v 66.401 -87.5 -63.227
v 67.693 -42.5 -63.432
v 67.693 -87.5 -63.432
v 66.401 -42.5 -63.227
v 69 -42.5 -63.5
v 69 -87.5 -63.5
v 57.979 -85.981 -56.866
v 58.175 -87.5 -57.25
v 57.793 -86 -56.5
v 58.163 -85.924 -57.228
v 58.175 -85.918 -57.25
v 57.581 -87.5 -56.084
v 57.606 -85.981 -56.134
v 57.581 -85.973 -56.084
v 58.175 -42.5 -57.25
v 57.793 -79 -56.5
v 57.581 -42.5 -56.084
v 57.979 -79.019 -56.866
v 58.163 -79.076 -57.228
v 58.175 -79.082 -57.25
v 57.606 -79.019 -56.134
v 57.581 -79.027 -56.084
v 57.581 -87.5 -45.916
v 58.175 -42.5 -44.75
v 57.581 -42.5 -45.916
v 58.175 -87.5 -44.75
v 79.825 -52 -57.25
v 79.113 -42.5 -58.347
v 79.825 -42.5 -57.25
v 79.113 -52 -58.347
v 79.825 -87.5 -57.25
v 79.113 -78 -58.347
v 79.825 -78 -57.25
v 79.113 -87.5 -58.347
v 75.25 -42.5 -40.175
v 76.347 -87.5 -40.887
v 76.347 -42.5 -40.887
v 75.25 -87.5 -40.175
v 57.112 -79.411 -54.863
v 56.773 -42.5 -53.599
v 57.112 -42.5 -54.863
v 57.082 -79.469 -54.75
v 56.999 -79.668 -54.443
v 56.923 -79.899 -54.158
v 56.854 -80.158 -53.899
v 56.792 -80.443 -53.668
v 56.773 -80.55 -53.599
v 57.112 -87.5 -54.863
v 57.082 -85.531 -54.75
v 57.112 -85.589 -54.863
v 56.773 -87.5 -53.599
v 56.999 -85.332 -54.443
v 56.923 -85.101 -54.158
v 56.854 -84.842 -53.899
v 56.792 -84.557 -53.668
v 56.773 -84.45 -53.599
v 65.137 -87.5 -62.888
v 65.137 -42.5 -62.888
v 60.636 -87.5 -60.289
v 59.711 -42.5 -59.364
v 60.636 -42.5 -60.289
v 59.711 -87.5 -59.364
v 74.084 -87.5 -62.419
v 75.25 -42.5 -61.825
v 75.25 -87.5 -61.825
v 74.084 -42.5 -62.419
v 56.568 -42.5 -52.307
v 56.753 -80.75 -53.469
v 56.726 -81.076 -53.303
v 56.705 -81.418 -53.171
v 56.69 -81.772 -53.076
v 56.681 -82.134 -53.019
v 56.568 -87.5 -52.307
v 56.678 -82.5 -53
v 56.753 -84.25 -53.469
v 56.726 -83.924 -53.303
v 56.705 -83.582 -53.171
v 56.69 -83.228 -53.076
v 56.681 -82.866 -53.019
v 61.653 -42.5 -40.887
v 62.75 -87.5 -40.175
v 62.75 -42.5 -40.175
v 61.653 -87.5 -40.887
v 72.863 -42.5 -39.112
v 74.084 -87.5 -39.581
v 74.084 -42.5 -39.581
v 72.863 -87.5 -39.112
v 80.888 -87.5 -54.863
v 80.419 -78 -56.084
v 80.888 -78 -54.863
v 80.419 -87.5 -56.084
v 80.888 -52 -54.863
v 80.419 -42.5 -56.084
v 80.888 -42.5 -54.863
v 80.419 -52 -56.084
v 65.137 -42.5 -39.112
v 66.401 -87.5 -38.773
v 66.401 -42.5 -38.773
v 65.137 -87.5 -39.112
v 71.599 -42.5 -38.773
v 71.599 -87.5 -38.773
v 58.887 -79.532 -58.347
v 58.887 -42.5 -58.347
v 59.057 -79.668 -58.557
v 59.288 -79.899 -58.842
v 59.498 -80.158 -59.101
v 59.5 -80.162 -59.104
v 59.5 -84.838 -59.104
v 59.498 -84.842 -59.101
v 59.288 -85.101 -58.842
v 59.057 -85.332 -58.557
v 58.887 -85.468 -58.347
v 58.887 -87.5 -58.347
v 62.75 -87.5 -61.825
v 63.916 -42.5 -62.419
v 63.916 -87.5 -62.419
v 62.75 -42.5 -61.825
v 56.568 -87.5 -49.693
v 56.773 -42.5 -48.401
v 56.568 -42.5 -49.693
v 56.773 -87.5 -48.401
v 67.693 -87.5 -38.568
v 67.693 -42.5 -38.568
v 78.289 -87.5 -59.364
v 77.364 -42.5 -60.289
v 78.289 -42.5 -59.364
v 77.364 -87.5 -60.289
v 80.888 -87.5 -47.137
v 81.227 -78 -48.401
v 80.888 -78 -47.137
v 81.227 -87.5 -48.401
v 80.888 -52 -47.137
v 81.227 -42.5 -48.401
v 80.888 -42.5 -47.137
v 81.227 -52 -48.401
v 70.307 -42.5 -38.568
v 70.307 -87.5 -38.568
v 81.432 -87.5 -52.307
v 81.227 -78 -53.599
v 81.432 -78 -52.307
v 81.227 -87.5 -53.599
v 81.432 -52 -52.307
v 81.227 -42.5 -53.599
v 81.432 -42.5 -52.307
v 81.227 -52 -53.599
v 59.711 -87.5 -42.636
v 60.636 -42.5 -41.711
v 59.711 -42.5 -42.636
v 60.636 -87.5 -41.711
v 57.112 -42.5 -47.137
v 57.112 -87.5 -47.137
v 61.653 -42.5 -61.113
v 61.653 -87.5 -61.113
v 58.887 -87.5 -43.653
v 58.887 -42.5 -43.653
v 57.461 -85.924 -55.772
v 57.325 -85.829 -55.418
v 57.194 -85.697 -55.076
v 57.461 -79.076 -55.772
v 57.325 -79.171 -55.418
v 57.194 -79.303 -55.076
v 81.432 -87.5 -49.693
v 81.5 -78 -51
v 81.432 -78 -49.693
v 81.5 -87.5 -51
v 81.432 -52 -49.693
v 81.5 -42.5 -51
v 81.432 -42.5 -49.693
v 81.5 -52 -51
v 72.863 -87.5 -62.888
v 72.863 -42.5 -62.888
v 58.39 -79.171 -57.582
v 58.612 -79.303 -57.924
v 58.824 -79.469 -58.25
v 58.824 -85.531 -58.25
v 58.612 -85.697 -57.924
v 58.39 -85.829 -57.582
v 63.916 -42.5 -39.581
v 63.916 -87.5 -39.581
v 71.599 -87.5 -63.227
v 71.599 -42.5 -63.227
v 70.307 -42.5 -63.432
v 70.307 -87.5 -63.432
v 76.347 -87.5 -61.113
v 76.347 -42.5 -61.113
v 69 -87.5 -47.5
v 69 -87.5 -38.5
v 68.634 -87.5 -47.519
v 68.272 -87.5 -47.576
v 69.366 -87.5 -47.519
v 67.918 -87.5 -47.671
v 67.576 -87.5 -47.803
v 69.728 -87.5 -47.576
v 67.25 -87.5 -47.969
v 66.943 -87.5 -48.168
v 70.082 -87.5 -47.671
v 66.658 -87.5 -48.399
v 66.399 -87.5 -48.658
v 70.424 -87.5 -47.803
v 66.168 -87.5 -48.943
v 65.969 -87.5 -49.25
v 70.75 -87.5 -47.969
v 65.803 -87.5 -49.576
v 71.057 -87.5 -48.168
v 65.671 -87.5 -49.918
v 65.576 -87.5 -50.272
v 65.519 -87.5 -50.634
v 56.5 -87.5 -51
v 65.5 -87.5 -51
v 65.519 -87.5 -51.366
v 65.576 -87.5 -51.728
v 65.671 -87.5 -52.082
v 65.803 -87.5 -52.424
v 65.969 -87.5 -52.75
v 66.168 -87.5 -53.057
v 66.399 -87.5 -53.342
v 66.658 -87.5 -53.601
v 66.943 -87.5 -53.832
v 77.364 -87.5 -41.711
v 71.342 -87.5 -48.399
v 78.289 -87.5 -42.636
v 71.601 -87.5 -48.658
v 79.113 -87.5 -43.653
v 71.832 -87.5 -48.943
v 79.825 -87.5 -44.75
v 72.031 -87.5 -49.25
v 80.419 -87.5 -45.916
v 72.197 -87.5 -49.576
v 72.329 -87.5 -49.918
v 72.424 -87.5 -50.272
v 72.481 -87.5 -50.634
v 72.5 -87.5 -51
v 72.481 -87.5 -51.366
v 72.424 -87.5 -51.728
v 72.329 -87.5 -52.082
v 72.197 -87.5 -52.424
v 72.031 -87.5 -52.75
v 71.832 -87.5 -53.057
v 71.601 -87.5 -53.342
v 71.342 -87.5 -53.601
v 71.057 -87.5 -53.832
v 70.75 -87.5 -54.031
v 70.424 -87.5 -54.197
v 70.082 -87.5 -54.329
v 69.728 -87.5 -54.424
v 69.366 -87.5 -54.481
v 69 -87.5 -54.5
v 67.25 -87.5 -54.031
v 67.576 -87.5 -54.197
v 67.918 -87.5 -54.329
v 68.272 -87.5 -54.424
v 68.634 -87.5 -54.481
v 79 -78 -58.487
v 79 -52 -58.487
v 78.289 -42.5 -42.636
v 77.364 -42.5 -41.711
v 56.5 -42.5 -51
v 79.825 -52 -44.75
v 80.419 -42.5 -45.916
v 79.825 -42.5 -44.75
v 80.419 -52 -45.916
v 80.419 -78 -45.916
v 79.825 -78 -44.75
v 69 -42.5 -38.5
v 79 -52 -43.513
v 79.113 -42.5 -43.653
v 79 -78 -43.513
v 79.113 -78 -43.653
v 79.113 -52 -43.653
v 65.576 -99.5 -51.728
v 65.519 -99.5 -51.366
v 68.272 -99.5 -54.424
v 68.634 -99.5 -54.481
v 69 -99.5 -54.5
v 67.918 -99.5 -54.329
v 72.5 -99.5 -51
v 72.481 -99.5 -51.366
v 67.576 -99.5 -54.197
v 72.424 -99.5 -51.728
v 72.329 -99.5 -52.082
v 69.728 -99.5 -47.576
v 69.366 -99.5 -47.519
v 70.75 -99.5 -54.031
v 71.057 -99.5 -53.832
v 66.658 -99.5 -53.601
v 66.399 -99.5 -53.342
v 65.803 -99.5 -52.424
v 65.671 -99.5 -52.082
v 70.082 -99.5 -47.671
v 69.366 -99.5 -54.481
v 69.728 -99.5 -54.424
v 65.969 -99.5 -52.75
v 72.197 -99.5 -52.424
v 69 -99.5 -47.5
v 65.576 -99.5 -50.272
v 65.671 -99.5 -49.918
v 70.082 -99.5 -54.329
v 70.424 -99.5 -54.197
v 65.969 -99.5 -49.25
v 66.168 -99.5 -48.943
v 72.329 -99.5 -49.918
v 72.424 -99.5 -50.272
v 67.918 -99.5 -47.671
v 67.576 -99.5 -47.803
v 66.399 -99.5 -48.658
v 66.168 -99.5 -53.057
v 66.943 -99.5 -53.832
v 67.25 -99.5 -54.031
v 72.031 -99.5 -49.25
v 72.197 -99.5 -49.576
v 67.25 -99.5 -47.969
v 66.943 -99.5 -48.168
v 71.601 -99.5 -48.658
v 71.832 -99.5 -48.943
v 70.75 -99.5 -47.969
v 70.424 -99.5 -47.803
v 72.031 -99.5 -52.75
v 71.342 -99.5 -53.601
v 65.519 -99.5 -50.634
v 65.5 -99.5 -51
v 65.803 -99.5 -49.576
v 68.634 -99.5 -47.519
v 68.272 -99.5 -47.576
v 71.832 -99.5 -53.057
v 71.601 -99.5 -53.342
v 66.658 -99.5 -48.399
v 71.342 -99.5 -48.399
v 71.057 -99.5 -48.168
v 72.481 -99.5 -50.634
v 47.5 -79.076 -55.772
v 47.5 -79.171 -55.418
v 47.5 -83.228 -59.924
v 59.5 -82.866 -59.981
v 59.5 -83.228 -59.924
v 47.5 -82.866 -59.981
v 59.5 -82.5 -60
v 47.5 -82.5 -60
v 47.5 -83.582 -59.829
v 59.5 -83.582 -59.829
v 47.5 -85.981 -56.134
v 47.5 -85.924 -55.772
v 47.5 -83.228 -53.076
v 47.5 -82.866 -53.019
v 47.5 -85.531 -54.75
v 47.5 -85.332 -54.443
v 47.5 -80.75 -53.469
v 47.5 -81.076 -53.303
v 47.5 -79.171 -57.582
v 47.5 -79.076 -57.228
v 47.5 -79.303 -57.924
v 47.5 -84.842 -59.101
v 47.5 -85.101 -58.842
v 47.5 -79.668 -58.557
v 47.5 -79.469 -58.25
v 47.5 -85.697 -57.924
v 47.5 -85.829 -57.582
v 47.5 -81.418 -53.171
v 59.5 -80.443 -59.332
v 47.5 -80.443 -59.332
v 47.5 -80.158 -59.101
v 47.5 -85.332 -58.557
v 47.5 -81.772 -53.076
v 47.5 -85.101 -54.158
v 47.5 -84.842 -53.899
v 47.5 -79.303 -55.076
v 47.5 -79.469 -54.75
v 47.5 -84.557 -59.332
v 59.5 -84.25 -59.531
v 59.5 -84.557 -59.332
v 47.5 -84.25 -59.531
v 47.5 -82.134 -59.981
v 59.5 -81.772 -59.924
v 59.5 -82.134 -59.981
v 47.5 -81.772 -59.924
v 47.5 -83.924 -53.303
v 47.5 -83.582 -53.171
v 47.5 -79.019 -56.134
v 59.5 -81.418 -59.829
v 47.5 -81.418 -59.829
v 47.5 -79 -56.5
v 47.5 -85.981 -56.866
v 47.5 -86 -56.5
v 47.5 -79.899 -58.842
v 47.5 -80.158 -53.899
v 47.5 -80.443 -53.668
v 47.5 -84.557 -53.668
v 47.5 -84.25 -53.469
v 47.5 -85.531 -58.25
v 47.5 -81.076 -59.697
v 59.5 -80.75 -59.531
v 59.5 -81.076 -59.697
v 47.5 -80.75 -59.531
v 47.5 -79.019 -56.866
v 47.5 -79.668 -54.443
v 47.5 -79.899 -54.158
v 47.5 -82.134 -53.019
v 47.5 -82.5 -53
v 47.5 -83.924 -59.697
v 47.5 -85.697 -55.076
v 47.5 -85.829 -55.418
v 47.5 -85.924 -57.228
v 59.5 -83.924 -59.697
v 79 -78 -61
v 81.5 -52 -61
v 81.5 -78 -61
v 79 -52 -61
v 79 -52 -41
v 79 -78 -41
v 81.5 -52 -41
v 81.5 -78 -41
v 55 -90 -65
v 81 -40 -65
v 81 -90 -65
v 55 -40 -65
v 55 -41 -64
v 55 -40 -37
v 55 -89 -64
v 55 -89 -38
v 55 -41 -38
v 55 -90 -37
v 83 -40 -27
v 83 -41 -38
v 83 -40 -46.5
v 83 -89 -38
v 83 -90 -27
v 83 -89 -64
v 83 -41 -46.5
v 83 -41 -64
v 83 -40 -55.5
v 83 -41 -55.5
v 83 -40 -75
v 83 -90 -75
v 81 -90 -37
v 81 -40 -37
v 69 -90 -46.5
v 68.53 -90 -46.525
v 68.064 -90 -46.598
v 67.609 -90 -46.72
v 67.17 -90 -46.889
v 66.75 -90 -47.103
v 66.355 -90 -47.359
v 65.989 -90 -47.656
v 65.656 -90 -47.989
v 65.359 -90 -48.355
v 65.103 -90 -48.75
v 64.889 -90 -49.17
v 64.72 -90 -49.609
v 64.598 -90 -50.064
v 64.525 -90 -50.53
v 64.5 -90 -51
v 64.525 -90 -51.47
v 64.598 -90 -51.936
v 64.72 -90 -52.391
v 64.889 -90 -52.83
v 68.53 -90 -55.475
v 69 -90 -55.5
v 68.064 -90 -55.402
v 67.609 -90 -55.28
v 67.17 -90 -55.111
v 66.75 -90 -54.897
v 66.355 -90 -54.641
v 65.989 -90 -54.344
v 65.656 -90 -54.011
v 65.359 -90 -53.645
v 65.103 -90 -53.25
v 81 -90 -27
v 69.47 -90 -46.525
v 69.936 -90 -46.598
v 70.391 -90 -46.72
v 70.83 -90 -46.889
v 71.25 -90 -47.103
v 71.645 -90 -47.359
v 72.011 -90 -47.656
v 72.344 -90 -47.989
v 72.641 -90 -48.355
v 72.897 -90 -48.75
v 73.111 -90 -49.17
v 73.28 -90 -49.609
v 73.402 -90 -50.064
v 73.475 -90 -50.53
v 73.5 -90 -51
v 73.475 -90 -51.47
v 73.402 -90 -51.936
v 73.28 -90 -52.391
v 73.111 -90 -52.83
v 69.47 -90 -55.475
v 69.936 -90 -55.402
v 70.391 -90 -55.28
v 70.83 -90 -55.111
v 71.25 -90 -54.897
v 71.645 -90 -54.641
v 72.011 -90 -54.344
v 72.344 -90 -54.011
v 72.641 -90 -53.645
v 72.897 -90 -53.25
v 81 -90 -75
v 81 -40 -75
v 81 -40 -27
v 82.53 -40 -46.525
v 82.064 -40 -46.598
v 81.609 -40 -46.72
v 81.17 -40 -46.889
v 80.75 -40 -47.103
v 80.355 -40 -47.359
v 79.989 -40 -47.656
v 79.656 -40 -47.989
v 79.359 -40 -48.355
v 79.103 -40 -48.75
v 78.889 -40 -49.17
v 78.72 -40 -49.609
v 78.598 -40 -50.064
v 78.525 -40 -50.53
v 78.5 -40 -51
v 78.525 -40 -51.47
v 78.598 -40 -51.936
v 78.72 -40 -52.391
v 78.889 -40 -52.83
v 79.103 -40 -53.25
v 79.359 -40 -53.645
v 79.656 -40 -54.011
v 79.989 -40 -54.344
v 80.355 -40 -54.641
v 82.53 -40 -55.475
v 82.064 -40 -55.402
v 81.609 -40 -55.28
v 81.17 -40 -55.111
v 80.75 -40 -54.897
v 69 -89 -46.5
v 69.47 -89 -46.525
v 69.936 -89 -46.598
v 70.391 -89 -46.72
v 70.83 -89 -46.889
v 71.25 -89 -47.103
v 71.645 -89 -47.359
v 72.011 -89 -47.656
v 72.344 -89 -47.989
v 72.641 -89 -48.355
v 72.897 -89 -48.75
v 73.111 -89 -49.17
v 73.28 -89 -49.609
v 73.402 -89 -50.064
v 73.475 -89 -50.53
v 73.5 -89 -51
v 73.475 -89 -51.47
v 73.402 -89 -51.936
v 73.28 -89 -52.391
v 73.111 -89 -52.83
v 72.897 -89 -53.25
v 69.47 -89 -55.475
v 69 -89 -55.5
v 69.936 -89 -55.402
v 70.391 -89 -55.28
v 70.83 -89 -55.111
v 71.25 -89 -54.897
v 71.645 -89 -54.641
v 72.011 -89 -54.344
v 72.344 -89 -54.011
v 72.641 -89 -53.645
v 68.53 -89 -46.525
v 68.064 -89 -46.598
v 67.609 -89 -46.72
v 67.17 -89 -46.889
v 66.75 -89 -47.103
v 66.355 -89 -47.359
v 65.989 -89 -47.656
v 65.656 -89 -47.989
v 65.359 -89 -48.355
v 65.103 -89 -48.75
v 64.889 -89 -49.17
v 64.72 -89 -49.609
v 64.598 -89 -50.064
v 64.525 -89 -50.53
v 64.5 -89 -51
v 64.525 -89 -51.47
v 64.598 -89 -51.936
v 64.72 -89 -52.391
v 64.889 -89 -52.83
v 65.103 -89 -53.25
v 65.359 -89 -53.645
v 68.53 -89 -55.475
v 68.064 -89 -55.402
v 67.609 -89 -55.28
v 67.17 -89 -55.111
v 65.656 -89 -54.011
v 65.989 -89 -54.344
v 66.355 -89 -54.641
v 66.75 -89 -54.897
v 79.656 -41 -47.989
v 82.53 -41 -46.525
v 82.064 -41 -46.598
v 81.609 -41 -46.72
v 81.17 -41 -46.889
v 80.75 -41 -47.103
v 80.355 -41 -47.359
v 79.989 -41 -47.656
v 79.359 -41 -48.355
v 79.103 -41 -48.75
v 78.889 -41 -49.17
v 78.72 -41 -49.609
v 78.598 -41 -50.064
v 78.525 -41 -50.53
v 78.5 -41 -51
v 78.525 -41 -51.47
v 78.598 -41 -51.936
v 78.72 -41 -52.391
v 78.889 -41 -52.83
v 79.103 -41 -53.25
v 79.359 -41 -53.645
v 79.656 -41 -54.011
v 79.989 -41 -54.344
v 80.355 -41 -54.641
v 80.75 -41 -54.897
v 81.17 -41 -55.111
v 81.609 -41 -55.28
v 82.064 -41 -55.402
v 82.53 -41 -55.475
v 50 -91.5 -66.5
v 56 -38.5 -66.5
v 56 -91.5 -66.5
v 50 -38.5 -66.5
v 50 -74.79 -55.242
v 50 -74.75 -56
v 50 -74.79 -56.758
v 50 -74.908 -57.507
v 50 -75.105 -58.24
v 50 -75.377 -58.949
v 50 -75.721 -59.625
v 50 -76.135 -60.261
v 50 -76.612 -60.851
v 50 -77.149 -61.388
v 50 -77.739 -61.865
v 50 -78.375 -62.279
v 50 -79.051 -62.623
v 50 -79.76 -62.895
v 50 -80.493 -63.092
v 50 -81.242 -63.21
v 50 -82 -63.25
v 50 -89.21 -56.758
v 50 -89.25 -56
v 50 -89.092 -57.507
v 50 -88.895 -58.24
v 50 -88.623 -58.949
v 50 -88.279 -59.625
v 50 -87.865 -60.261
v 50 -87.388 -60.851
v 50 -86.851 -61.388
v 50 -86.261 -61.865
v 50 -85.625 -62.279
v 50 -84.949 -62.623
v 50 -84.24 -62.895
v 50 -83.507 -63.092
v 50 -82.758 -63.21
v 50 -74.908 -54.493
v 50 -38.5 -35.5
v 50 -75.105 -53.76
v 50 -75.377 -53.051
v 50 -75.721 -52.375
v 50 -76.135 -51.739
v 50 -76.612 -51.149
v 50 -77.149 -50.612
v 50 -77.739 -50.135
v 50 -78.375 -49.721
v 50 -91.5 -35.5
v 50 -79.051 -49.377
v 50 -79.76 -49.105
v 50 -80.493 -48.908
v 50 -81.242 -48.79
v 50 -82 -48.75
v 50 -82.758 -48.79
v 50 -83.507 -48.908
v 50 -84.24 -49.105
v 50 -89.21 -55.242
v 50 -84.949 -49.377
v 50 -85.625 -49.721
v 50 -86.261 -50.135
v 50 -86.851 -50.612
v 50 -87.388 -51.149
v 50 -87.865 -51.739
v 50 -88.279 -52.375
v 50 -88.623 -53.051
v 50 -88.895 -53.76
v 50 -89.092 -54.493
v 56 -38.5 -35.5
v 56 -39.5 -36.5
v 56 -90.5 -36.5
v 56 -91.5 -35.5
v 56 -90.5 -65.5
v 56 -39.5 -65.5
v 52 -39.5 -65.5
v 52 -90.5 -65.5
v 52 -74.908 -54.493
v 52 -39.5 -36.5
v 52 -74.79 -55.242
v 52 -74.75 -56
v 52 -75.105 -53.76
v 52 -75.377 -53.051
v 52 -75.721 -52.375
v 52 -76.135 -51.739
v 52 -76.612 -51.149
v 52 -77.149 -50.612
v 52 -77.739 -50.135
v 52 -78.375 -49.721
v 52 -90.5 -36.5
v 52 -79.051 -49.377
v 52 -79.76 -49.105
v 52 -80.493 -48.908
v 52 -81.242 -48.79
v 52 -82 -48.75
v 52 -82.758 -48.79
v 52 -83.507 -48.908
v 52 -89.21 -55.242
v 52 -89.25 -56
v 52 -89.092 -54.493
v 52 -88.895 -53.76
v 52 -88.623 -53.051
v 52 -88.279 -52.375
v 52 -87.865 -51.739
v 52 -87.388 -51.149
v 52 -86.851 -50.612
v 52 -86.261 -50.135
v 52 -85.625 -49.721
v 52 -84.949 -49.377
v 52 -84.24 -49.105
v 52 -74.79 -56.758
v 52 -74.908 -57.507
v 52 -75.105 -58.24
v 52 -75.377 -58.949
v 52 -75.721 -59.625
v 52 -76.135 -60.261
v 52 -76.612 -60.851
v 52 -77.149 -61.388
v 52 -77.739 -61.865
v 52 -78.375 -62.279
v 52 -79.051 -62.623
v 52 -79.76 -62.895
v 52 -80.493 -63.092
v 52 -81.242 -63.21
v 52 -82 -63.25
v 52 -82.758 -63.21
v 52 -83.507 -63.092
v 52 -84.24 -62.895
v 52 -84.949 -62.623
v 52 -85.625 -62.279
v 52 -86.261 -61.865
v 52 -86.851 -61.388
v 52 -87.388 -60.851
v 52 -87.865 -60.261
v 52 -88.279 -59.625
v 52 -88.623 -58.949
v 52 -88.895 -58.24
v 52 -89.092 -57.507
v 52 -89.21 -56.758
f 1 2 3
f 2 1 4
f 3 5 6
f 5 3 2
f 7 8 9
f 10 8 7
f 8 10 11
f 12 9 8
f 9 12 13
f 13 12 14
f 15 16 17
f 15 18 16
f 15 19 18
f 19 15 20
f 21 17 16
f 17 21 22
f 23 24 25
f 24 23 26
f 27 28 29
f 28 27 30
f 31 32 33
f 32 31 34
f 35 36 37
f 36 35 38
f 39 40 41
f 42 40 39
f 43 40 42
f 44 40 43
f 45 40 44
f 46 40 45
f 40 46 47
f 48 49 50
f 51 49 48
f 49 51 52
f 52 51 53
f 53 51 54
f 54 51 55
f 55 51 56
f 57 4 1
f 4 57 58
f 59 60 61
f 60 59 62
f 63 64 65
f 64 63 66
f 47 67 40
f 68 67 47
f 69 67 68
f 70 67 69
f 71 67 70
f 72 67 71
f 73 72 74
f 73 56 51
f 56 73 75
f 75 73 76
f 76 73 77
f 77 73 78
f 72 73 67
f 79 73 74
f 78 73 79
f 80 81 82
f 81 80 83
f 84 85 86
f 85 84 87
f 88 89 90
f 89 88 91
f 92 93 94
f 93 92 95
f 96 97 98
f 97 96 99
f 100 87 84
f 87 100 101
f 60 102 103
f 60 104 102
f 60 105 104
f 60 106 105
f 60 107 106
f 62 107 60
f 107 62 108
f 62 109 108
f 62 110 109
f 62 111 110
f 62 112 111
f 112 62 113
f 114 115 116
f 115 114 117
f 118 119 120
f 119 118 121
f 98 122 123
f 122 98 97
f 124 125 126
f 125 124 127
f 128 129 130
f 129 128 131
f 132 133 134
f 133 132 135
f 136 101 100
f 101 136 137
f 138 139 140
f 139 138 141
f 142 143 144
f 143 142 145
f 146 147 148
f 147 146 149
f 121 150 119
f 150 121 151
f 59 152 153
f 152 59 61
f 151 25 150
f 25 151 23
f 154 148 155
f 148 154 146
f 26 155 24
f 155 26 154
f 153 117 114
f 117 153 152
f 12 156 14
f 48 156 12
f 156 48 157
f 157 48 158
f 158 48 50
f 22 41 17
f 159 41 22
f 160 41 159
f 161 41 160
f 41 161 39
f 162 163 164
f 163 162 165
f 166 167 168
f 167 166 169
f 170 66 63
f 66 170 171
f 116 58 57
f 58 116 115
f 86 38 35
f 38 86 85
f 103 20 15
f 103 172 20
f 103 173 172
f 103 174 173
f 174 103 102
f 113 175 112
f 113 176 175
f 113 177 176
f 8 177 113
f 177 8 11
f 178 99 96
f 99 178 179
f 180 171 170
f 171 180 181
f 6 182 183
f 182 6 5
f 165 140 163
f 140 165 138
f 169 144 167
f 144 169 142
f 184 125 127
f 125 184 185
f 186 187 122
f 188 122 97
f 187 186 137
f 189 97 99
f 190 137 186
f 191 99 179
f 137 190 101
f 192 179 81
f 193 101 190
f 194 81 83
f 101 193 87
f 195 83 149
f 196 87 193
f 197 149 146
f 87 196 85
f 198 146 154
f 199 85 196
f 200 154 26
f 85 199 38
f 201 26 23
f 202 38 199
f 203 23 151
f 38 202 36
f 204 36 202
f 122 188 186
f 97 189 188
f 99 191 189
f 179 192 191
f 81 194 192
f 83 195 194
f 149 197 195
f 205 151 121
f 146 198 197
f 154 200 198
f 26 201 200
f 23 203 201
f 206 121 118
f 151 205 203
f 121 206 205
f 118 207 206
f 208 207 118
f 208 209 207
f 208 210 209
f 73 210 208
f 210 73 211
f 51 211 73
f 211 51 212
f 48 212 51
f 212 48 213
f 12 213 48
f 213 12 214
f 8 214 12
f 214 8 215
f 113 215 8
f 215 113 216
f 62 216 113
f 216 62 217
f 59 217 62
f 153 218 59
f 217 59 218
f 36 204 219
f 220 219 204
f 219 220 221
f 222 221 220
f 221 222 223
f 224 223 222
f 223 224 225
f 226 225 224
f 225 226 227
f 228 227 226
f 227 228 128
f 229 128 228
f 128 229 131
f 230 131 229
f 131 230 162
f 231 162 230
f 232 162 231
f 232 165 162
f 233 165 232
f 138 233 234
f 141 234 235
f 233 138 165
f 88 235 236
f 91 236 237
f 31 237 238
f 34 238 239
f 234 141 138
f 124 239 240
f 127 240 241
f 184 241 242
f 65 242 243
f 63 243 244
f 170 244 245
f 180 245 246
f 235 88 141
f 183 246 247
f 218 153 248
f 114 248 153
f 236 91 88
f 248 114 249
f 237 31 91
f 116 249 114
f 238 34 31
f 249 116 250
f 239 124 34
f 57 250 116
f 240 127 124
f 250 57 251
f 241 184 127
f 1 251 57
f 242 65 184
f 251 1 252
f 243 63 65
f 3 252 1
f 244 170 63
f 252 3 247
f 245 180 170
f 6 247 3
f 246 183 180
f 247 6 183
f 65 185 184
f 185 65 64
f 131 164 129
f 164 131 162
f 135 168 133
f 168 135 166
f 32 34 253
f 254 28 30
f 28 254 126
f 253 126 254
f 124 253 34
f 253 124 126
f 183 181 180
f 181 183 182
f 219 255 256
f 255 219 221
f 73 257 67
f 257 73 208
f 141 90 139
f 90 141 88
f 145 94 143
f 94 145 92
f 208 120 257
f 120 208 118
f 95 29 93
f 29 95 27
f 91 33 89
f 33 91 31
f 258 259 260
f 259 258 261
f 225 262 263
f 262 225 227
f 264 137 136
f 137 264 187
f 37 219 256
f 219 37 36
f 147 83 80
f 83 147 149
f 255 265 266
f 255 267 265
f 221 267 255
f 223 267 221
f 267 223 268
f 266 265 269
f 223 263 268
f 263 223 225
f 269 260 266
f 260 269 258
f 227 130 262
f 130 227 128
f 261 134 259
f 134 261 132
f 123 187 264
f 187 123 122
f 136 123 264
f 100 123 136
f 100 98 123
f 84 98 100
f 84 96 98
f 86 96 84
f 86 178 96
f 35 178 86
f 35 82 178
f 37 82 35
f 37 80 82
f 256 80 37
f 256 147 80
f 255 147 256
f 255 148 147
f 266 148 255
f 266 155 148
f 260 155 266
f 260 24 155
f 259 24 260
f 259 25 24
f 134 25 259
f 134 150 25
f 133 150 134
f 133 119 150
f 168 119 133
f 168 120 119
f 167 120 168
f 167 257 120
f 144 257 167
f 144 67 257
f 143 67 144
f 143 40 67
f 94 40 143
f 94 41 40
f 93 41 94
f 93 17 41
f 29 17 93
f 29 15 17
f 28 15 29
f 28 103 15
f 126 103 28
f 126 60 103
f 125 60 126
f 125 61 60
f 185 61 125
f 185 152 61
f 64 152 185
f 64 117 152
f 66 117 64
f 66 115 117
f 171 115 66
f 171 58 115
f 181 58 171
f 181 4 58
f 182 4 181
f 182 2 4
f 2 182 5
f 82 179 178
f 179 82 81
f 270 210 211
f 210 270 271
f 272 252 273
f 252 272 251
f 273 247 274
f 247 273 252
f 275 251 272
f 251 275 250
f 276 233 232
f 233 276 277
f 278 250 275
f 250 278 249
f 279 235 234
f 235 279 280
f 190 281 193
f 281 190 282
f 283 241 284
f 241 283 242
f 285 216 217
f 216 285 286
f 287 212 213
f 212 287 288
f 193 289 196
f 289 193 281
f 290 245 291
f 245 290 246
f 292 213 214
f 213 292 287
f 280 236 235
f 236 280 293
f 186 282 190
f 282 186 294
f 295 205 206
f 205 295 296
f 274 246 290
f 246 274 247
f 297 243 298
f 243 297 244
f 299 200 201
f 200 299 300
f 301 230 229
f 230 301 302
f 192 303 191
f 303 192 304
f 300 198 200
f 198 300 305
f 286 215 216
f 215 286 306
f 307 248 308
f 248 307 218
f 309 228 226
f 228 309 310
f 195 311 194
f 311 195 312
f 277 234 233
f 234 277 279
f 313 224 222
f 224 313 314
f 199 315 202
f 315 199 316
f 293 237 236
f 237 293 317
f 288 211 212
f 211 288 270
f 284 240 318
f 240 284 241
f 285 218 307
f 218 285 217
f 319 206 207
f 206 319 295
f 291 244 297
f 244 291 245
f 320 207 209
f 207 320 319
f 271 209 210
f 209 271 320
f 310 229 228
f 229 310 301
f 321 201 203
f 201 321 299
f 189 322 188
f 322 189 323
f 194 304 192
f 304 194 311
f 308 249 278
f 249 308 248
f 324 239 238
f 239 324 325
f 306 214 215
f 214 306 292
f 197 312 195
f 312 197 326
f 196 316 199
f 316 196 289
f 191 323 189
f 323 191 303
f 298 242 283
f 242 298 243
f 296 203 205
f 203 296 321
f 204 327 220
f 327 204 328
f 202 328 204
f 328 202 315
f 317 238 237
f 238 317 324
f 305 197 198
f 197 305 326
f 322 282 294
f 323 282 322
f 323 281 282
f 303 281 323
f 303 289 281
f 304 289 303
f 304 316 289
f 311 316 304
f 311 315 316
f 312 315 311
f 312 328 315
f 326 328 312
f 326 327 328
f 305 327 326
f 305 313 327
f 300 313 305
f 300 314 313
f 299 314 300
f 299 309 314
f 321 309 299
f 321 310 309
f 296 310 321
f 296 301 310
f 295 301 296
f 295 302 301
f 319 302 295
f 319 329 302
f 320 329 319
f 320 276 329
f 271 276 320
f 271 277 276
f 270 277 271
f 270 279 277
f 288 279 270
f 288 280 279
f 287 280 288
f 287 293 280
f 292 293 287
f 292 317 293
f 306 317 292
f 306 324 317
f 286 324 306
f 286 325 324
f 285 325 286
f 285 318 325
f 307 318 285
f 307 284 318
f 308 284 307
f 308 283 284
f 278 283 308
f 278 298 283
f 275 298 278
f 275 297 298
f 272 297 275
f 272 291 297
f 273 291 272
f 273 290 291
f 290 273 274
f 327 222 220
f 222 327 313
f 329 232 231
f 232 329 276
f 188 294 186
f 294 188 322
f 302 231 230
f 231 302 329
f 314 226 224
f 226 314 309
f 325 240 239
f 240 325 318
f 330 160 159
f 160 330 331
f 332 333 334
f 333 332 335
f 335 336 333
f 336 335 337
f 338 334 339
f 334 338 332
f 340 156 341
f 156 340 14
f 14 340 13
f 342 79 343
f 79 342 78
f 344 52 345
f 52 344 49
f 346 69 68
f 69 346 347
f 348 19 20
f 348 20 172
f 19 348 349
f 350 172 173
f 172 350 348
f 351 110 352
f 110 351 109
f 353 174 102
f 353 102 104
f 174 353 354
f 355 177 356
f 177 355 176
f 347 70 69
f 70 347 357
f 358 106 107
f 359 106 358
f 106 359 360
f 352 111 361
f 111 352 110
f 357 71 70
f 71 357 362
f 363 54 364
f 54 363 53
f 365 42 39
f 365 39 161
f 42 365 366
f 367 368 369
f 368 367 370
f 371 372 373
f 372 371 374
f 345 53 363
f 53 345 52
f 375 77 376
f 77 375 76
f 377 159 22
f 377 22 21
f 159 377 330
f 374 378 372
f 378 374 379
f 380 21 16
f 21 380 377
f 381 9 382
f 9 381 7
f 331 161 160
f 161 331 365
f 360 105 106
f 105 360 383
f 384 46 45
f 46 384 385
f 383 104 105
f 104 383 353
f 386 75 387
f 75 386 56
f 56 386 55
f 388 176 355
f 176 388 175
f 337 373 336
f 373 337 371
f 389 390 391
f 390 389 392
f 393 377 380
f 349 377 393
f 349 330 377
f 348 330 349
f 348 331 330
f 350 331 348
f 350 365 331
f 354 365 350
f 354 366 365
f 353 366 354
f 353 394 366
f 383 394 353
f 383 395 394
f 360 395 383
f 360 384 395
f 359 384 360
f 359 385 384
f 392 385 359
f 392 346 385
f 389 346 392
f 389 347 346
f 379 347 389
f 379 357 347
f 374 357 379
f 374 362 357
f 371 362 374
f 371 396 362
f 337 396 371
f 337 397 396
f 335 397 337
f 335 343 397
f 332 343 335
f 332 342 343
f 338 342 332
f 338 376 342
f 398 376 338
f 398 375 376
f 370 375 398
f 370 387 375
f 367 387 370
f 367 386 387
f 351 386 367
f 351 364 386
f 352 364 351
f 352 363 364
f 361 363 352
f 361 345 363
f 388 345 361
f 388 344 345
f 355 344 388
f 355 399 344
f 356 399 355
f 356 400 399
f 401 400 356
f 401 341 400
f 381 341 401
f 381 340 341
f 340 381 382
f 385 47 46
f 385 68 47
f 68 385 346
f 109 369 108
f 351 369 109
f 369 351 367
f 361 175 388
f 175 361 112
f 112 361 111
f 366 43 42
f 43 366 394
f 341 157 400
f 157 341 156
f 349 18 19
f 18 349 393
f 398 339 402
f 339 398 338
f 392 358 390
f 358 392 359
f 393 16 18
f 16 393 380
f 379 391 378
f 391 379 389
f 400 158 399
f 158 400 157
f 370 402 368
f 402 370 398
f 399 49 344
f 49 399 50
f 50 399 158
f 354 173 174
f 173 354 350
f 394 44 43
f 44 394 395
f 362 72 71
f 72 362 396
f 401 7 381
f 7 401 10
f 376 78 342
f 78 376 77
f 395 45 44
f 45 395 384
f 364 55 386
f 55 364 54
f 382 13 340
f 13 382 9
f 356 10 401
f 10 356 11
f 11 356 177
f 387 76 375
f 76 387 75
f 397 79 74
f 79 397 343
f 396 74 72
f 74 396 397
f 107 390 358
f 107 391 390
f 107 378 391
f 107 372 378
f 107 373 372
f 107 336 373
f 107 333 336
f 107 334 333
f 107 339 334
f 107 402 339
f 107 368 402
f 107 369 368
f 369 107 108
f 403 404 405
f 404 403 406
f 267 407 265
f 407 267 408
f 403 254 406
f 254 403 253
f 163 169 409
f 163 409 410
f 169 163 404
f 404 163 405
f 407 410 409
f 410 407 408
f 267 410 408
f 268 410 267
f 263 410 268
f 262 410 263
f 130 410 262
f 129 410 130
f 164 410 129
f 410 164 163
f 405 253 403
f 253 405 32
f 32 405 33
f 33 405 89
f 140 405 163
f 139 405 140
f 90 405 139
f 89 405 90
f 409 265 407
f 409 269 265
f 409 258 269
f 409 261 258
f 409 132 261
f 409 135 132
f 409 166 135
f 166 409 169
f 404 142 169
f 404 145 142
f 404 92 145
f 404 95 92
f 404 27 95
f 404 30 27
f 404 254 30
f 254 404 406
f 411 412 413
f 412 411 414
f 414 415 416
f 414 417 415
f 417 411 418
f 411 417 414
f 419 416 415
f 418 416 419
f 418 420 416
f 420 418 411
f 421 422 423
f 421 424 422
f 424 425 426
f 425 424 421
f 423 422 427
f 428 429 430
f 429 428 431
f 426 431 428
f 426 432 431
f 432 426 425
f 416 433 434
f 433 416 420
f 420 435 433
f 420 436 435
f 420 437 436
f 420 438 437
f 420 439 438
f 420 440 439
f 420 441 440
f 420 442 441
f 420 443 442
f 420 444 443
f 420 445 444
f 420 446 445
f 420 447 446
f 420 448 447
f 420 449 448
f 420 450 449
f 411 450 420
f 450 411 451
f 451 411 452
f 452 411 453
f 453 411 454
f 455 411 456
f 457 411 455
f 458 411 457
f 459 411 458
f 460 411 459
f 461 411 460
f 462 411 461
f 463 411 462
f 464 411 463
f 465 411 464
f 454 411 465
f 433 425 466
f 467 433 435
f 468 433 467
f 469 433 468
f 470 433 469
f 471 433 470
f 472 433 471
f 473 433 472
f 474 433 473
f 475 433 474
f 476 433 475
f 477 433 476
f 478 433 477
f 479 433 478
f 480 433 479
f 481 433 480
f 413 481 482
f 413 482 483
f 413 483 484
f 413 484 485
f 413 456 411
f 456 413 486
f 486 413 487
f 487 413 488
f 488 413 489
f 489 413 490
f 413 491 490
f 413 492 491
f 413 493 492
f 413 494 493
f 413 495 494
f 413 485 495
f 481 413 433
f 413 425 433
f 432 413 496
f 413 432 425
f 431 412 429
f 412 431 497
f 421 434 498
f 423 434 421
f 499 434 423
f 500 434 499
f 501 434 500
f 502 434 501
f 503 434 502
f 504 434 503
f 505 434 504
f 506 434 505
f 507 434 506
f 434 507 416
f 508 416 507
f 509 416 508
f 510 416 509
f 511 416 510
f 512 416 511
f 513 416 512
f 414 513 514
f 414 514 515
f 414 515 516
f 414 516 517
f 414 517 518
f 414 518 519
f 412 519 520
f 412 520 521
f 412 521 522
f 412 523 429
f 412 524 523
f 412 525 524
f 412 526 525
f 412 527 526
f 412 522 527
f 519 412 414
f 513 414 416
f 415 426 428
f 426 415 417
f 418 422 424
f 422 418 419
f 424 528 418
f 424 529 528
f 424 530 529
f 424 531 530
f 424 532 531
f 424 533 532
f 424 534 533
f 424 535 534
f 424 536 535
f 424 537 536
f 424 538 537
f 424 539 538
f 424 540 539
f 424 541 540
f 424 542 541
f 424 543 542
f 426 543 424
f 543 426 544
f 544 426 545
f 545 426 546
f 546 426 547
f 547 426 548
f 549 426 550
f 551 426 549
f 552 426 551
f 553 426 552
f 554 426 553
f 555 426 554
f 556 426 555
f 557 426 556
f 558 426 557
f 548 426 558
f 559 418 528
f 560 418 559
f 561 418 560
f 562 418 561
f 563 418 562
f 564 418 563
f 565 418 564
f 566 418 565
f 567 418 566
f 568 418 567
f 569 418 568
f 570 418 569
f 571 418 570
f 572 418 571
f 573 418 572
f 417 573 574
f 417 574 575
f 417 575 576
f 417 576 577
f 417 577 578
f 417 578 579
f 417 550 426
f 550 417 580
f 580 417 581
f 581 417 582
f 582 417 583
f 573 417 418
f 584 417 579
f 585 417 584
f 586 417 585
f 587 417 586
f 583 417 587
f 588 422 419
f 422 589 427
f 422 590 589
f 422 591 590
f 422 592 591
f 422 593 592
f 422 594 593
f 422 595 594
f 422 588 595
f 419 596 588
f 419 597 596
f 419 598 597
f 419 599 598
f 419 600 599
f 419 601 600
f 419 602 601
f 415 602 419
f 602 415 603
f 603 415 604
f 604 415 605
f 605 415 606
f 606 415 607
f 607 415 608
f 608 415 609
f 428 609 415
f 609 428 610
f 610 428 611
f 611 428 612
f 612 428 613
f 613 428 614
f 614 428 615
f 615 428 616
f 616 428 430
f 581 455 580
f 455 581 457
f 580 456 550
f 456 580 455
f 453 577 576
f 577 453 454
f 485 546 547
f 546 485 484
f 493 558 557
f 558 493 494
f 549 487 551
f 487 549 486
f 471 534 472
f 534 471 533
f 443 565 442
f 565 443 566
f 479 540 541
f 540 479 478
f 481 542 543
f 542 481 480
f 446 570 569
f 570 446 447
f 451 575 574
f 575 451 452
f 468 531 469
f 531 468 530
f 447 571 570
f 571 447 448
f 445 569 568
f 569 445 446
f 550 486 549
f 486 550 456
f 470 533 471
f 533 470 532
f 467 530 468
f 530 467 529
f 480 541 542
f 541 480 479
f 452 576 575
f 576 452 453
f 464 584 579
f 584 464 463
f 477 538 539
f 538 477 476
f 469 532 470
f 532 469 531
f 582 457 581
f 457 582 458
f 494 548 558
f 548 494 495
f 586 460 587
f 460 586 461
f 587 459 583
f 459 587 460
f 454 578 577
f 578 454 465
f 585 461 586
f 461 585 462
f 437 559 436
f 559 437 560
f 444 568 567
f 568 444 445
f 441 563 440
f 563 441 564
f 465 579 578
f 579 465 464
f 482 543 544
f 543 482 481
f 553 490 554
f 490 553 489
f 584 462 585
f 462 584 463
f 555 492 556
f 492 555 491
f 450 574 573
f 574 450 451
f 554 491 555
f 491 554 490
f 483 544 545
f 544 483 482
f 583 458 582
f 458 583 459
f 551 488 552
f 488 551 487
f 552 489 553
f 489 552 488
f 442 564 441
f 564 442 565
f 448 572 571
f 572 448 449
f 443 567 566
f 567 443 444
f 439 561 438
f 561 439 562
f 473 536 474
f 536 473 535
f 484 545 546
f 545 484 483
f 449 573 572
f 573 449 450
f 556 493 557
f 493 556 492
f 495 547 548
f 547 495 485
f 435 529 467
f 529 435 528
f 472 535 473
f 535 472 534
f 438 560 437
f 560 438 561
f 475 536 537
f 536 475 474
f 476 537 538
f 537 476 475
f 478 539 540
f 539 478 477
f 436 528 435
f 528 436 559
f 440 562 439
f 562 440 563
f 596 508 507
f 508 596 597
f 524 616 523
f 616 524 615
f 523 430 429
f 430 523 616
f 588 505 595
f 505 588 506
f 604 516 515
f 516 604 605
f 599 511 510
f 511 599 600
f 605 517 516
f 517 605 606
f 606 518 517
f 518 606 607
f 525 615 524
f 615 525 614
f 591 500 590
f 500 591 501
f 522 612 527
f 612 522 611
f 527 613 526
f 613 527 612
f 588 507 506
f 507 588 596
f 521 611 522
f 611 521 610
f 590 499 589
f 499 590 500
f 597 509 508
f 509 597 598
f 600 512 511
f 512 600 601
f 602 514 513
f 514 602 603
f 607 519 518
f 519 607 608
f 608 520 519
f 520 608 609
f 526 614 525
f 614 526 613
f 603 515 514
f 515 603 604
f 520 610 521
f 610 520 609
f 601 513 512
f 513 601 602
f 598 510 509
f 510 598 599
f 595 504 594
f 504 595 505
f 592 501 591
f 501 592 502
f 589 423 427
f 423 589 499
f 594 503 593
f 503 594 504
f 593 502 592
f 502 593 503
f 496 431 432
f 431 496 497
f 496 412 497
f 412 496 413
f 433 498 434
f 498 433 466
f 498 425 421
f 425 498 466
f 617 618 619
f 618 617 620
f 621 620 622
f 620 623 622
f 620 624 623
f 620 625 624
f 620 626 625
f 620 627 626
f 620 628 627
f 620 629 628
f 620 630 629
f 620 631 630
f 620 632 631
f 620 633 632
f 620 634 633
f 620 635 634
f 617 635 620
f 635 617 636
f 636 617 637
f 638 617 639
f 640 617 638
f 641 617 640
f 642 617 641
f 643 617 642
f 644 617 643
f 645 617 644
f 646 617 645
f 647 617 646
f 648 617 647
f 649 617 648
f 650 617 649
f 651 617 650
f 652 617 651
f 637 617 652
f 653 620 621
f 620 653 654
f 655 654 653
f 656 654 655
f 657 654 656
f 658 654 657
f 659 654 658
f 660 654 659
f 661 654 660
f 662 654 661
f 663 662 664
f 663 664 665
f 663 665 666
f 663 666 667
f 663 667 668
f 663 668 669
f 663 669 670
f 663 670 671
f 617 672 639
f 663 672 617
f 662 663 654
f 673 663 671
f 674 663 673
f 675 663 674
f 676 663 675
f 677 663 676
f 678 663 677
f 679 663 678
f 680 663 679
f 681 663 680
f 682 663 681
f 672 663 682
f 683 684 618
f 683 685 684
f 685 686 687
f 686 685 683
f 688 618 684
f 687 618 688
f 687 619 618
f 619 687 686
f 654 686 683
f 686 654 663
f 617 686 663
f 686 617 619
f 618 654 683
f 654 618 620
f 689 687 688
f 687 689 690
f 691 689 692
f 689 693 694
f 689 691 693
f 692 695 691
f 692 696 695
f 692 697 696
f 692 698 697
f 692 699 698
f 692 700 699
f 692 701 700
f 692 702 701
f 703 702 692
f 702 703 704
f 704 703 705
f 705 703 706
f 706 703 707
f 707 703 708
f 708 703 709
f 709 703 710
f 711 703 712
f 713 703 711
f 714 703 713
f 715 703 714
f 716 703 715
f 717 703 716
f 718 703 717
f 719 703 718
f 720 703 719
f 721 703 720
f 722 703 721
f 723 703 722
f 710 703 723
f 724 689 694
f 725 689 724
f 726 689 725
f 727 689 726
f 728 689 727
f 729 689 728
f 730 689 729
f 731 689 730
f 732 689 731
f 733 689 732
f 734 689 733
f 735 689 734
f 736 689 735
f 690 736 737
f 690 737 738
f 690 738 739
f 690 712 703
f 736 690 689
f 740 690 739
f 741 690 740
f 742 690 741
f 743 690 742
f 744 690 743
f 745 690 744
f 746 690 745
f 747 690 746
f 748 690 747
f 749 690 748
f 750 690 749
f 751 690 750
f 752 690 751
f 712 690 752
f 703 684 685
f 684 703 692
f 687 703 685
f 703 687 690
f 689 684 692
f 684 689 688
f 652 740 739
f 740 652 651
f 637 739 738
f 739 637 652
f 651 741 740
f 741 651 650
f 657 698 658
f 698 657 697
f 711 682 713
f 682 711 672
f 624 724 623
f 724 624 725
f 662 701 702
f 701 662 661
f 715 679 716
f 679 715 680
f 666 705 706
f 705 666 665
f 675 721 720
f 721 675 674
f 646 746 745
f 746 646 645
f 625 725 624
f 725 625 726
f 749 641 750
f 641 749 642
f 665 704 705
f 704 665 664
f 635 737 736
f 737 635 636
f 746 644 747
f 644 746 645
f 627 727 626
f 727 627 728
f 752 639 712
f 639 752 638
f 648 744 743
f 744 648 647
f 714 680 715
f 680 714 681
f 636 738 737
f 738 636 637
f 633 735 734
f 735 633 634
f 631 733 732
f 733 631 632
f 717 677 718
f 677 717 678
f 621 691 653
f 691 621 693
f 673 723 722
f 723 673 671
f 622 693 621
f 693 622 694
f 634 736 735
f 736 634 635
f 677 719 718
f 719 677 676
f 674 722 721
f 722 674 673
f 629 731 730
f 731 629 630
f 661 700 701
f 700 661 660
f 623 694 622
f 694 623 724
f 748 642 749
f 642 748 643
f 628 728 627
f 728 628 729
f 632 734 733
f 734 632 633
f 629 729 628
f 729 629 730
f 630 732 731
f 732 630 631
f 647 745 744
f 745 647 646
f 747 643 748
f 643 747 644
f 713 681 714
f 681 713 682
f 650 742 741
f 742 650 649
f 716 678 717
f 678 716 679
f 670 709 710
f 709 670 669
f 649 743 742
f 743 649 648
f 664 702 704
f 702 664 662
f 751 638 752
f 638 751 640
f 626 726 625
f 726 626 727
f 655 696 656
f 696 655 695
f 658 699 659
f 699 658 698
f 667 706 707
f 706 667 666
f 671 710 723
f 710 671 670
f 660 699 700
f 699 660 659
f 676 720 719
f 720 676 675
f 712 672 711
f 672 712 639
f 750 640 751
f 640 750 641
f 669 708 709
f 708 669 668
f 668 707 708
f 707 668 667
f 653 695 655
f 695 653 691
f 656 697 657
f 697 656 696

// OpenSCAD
// file: Tauchpumpenbox.scad
// Tauchpumpenhalterung

$fn = 60;

tauchpumpe = true;
box = true;
deckel = true;

if (tauchpumpe) tauchpumpe();
if (box) box();
if (deckel) deckel();
   

module tauchpumpe() {
    l=45;
    b=25;
    a=7;
    al=12;
    p=20;
    pl=26;
    pd=2.5;
    
    color("lightyellow")
    union() {
        rotate([90,0,0])
        cylinder(d=b,h=l,center=true);
        
        translate([0,l/2+al/2,0])
        rotate([90,0,0])
        cylinder(d=a,h=al,center=true);
        
        translate([b/2-a,l/2-5,b/2-al/2+9])
        cylinder(d=a,h=al,center=true);
        
        translate([-p/2,-pl/2,-b/2])
        cube([p,pl,pd]);
    }
}

module box() {
    l=50;
    b=28;
    h=b;
    w=2;
    s=10;

    a=9;
    al=12;

    difference() {
        cube([b,l,h],center=true);
        translate([0,0,w/2])
        cube([b-w,l-w,h+w*2],center=true);

        translate([0,l/2+al/2-5,0])
        rotate([90,0,0])
        cylinder(d=a,h=al,center=true);

        translate([0,-l/2,-b/2])
        rotate([90,0,0])
        cylinder(d=a,h=al,center=true);

    }
    
    translate([b/2,-l/2,-b/2])
    cube([s,l,w]);
    
    translate([-b/2-s,-l/2,-b/2])
    cube([s,l,w]);
    
}

module deckel(){
    l=50;
    b=28;
    h=b;
    w=2;
    s=10;

    a=9;
    al=12;
    difference() {
        translate([0,0,b/2+w])
        cube([b+w+1,l+w+1,3*w],center=true);
        translate([0,0,b/2])
        cube([b+w-1,l+w-1,3*w],center=true);
        translate([b/2-a,l/2-w-6,b/2-al/2+2+2*w])
        cylinder(d=14.5,h=al,center=true);

    }
}
// file: Parameter.scad
// Pflanzhaus Parameter

dachlaenge = 120;
wandhoehe = 80;
hz = 20;
hw = 2;
hd = 5;

dachhoehe = sqrt(2)*dachlaenge/2;
hausbreite = sqrt(2)*dachlaenge;
hauslaenge = 150;
fusshoehe = 20;
// main file
// Wassertank

include <Parameter.scad>;

use <Tauchpumpenbox.scad>;

wassertank = false;
tauchpumpenbox = true;

if (wassertank) wassertank();
    

if (tauchpumpenbox) {
    
    translate([69,-65,-51])
    rotate([180,90,0])
    union() {
        tauchpumpe();
        box();
        deckel();
    }
}

module wassertank() {
    color("lightgrey",0.8)
    union() {
        translate([0,-(wandhoehe+fusshoehe)/2,-50])
        difference(){
            cube([hausbreite,wandhoehe+fusshoehe,3*hz],center=true);
            translate([0,2,0])
            cube([hausbreite-2*hw,wandhoehe+fusshoehe+hw,3*hz-2*hw],center=true);
        }
        
        tankhalterung();
       
    }
}


module tankhalterung() {
    
    translate([-hausbreite/2,-20,-10])
    haltestab();

    translate([-hausbreite/2,-80,-10])
    haltestab();
    

    translate([hausbreite/2,-20,-10])
    rotate([0,0,180])
    haltestab();

  
    translate([hausbreite/2,-80,-10])
    rotate([0,0,180])
    haltestab();
    
    gleitschiene();

}


module haltestab() {
    difference() {
        translate([-0.5,0,0])
        cube([5,20,50],center=true);
        translate([1,0,hz/2])
        cube([hd,hz+4,hz+1],center=true);
    }
}


module gleitschiene() {
    translate([hausbreite/2-2*hw-1,-100,-26])
    union() {
        cube([3,80,5]);
        translate([-2.5,0,-10])
        cube([3,80,15]);
    }
    
    translate([hausbreite/2-2*hw-1,-100,-26-54])
    union() {
        cube([3,80,5]);
        translate([-2.5,0,0])
        cube([3,80,15]);
    }
}
